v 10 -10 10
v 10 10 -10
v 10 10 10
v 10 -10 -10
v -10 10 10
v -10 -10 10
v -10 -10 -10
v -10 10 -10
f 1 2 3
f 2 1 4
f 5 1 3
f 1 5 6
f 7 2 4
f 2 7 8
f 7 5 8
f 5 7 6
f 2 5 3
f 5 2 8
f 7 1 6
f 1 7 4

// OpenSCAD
// -------------------------------------+---------------------------------------+---------------------------------------+---------------------------------------
// Title:        Parametric Test Block
// Version:      1.2
// Release Date: 2018-07-28 (ISO 8601)
// Author:       Rohin Gosling
// -------------------------------------+---------------------------------------+---------------------------------------+---------------------------------------
//
// Description:
//
// - Simple 3D object generator, to generate test and calibration parts for 3D printers.
//
// Release Notes:
//
// - Version 1.2
//   Updated some default parameters to give the model slightly more consistant default settings.
//   * Updated the default width, height and length of the cuboid, from 10mm to 20mm.
//   * Set the default bore x, y and z diameter, to 10mm.
//
// - Version 1.1
//   * Removed extended ASCII characters to make the source code compatible with the UTF-8 encoding required by the Thingiverse Customizer.
//
// - Version 1.0
//   * Model created.
//
// -------------------------------------+---------------------------------------+---------------------------------------+---------------------------------------

// -------------------------------------+---------------------------------------+---------------------------------------+---------------------------------------
// Constants:
// -------------------------------------+---------------------------------------+---------------------------------------+---------------------------------------

// System constants.

C_CONSTANT = 0 + 0;     // Used to hide constant values from Thingiverse. Add to other constants to hide them as well.

// General constants.

C_NONE = C_CONSTANT + 0;

// SCG constants.

SCG_OVERLAP = C_CONSTANT + 0.01;    // Used for overlapping Boolean operations in order to avoid Boolean edge artefacts.

// Shape

C_SHAPE_NONE      = C_CONSTANT + 0;
C_SHAPE_CUBOID    = C_CONSTANT + 1;
C_SHAPE_CYLINDER  = C_CONSTANT + 2;
C_SHAPE_PYRAMID   = C_CONSTANT + 3;
C_SHAPE_PRISM     = C_CONSTANT + 4;
C_SHAPE_ELLIPSOID = C_CONSTANT + 5;
C_SHAPE_TORUS     = C_CONSTANT + 6;

// Minimum and maximum constraints.

C_RESOLUTION_MIN  = C_CONSTANT + 8;
C_RESOLUTION_MAX  = C_CONSTANT + 64;
C_SIZE_MIN        = C_CONSTANT + 1.0;
C_SIDE_COUNT_MIN  = C_CONSTANT + 3;
C_SIDE_COUNT_MAX  = C_CONSTANT + 12;


// -------------------------------------+---------------------------------------+---------------------------------------+---------------------------------------
// Thingiverse Parameters.
//
// - These parameters are used to integrate with the Thingiverse Customizer, and should only be used by the
//   class member variables specified in the "Model parameters" section below.
//
// - These Thingiverse Parameters should never be accessed from inside any module. We do this to enforce 
//   principles of object orientation.
//
// - By separating concerns between variables exposed to Thingiverse vs. variables used internally by the 
//   SCAD model (class), we are better able to manage the ordering and grouping of variables exposed to 
//   Thingiverse, vs. the ordering and constraints of variables used internally by the model.
//
// -------------------------------------+---------------------------------------+---------------------------------------+---------------------------------------

/* [Assembbly Parameters] */

object_shape    = 1;        // [ 1:Cuboid, 2:Cylinder, 3:Pyramid, 4:Prism, 5:Ellipsoid, 6:Torus ]
x_bore_shape    = 0;        // [ 0: None, 2:Cylinder, 4:Prism ]
y_bore_shape    = 0;        // [ 0: None, 2:Cylinder, 4:Prism ]
z_bore_shape    = 0;        // [ 0: None, 2:Cylinder, 4:Prism ]
resolution      = 128;

/* [Cuboid Parameters] */

cuboid_x      = 20.0;
cuboid_y      = 20.0;
cuboid_z      = 20.0;
cuboid_fillet = 0.0;

/* [Cylinder Parameters] */

cylinder_diameter_base = 20.0;
cylinder_diameter_top  = 20.0;
cylinder_height        = 20.0;

/* [Pyramid Parameters] */

pyramid_side_count  = 4;
pyramid_side_length = 20.0;
pyramid_height      = 20.0;

/* [Prism Parameters] */

prism_side_count  = 3;
prism_side_length = 20.0;
prism_height      = 20.0;

/* [Ellipsoid Parameters] */

ellipsoid_diameter_x = 20.0;
ellipsoid_diameter_y = 20.0;
ellipsoid_diameter_z = 20.0;

/* [Torus Parameters] */

torus_major_radius = 12.0;
torus_minor_radius = 6.0;

/* [Bore Parameters] */

x_bore_diameter         = 10;
y_bore_diameter         = 10;
z_bore_diameter         = 10;
x_bore_prism_side_count = 4;
y_bore_prism_side_count = 4;
z_bore_prism_side_count = 4;

// -------------------------------------+---------------------------------------+---------------------------------------+---------------------------------------
// Model parameters and geometric constraints. (Class member variables).
//
// - If we treat an OpenSCAD file as though it is an object oriented class, then we can prefix global variables
//   with "m_", to denote class membership. 
//   - As an alternative to "m_", we could also use "this_" as a standard. However, "m_" is shorter and faster to type.
//   - Another advantage of this convention, is that we can arrange parameters meant for display in Thingiverse, in 
//     an order that makes sense to the user, while arranging the member versions of the parameters in an order
//     that better accommodates constraint computation.
//
// - Once we have defined global variables as member variables of a class, in this case the class represented
//   by the SCAD file, then we are free to better manage global vs local scope of class member 
//   variables, vs. local module (method) variables.
//
// - Thingiverse only integrates constant literal values. So as long as we reference other parameters or 
//   initialize variables as expressions, then none of these will appear in the Thingiverse customizer.
//
// -------------------------------------+---------------------------------------+---------------------------------------+---------------------------------------

// Assembly Parameters

m_object_shape    = object_shape;
m_x_bore_shape    = x_bore_shape;
m_y_bore_shape    = y_bore_shape;
m_z_bore_shape    = z_bore_shape;
m_resolution      = clip ( resolution, C_RESOLUTION_MIN, C_RESOLUTION_MAX );

// Cuboid Parameters.

m_cuboid_x             = ( cuboid_x < C_SIZE_MIN ) ? C_SIZE_MIN : cuboid_x;
m_cuboid_y             = ( cuboid_y < C_SIZE_MIN ) ? C_SIZE_MIN : cuboid_y;
m_cuboid_z             = ( cuboid_z < C_SIZE_MIN ) ? C_SIZE_MIN : cuboid_z;
m_cuboid_min_dimention = ( m_cuboid_x < m_cuboid_y && m_cuboid_x < m_cuboid_z ) ? m_cuboid_x : ( m_cuboid_y < m_cuboid_x && m_cuboid_y < m_cuboid_z ) ? m_cuboid_y : m_cuboid_z;
m_cuboid_fillet        = clip ( cuboid_fillet, 0.0, m_cuboid_min_dimention/2.0 );

// Cylinder Parameters.

m_cylinder_diameter_base = ( cylinder_diameter_base < 0.0 ) ? 0.0 : cylinder_diameter_base;
m_cylinder_diameter_top  = ( cylinder_diameter_top  < 0.0 ) ? 0.0 : cylinder_diameter_top;
m_cylinder_height        = ( cylinder_height < C_SIZE_MIN ) ? C_SIZE_MIN : cylinder_height;

// Pyramid Parameters.

m_pyramid_side_count  = clip ( pyramid_side_count, C_SIDE_COUNT_MIN, C_SIDE_COUNT_MAX );
m_pyramid_side_length = ( pyramid_side_length < C_SIZE_MIN ) ? C_SIZE_MIN : pyramid_side_length;
m_pyramid_height      = ( pyramid_height < C_SIZE_MIN ) ? C_SIZE_MIN : pyramid_height;

// Prism Parameters.

m_prism_side_count  = clip ( prism_side_count, C_SIDE_COUNT_MIN, C_SIDE_COUNT_MAX );
m_prism_side_length = ( prism_side_length < C_SIZE_MIN ) ? C_SIZE_MIN : prism_side_length;
m_prism_height      = ( prism_height < C_SIZE_MIN ) ? C_SIZE_MIN : prism_height;

// Ellipsoid Parameters.

m_ellipsoid_diameter_x = ( ellipsoid_diameter_x < C_SIZE_MIN ) ? C_SIZE_MIN : ellipsoid_diameter_x;
m_ellipsoid_diameter_y = ( ellipsoid_diameter_y < C_SIZE_MIN ) ? C_SIZE_MIN : ellipsoid_diameter_y;
m_ellipsoid_diameter_z = ( ellipsoid_diameter_z < C_SIZE_MIN ) ? C_SIZE_MIN : ellipsoid_diameter_z;

// Torus Parameters.

m_torus_major_radius = ( torus_major_radius < C_SIZE_MIN ) ? C_SIZE_MIN : torus_major_radius;
m_torus_minor_radius = ( torus_minor_radius < C_SIZE_MIN ) ? C_SIZE_MIN : torus_minor_radius;

// Bore.

m_x_bore_diameter         = ( x_bore_diameter < C_SIZE_MIN ) ? C_SIZE_MIN : x_bore_diameter;
m_y_bore_diameter         = ( y_bore_diameter < C_SIZE_MIN ) ? C_SIZE_MIN : y_bore_diameter;
m_z_bore_diameter         = ( z_bore_diameter < C_SIZE_MIN ) ? C_SIZE_MIN : z_bore_diameter;
m_x_bore_prism_side_count = clip ( x_bore_prism_side_count, C_SIDE_COUNT_MIN, C_SIDE_COUNT_MAX );
m_y_bore_prism_side_count = clip ( y_bore_prism_side_count, C_SIDE_COUNT_MIN, C_SIDE_COUNT_MAX );
m_z_bore_prism_side_count = clip ( z_bore_prism_side_count, C_SIDE_COUNT_MIN, C_SIDE_COUNT_MAX );

// -------------------------------------+---------------------------------------+---------------------------------------+---------------------------------------
// DEBUG: Console Output. 
// -------------------------------------+---------------------------------------+---------------------------------------+---------------------------------------

C_DEBUG_ENABLED = false;

if ( C_DEBUG_ENABLED )
{
    //echo ( m_x = m_x ); 
}

// -------------------------------------+---------------------------------------+---------------------------------------+---------------------------------------
// Module:      Main
// Module Type: Model
//
// Description:
//
// - Program entry point.
//
// -------------------------------------+---------------------------------------+---------------------------------------+---------------------------------------

main();

module main ()
{   
    // Initialize model resolution.
    
    $fn = m_resolution;
    
    // Generate hinge assembly.
        
    assembly ();    
}

// -------------------------------------+---------------------------------------+---------------------------------------+---------------------------------------
// Module:      assembly_main
// Module Type: Assembly
//
// Description:
//
// - Main component assembly.
//
// Parameters:
//
// - N/A
//
// -------------------------------------+---------------------------------------+---------------------------------------+---------------------------------------

module assembly ()
{
    if      ( m_object_shape == C_SHAPE_NONE )      object_none ();
    else if ( m_object_shape == C_SHAPE_CUBOID )    object_cuboid ();
    else if ( m_object_shape == C_SHAPE_CYLINDER )  object_cylinder ();
    else if ( m_object_shape == C_SHAPE_PYRAMID )   object_pyramid ();
    else if ( m_object_shape == C_SHAPE_PRISM )     object_prism ();
    else if ( m_object_shape == C_SHAPE_ELLIPSOID ) object_ellipsoid ();
    else if ( m_object_shape == C_SHAPE_TORUS )     object_torus ();    
    else if ( m_object_shape == C_SHAPE_NONE )      object_none ();    
}

// -------------------------------------+---------------------------------------+---------------------------------------+---------------------------------------
// Module:      object_none
// Module Type: Object
//
// Description:
//
// - Placeholder module for dealing with zero object selection.
//
// Parameters:
//
// - N/A
//
// -------------------------------------+---------------------------------------+---------------------------------------+---------------------------------------

module object_none ()
{
}

// -------------------------------------+---------------------------------------+---------------------------------------+---------------------------------------
// Module:      object_cuboid
// Module Type: Object
//
// Description:
//
// - Cuboid object defined by width, length, height and fillet size.
//
// Parameters:
//
// - N/A
//
// -------------------------------------+---------------------------------------+---------------------------------------+---------------------------------------

module object_cuboid ()
{
    // Initialize parameters.
    
    sf = m_cuboid_fillet;
    sx = m_cuboid_x;
    sy = m_cuboid_y;
    sz = m_cuboid_z;
    
    // Generate object.

    difference ()
    {
        // Generate base object.
        
        if ( sf > 0 )
        {
            object_cuboid_filleted ();
        }
        else
        {
            cube ( size = [ sx, sy, sz ], center = true );
        }
        
        // Subtract bores.
        
        cutting_tool_bore ( sx, sy, sz );
    }
}

// -------------------------------------+---------------------------------------+---------------------------------------+---------------------------------------
// Module:      object_cuboid_filleted
// Module Type: Object
//
// Description:
//
// - Used by the Cuboid object, to implement fillets.
//
// Parameters:
//
// - N/A
//
// -------------------------------------+---------------------------------------+---------------------------------------+---------------------------------------

module object_cuboid_filleted ()
{
    // Local constants.
    
    EDGE_CENTER = 0;    
    EDGE_ANGLE  = 1;
    EDGE_LENGTH = 2;
    
    // Initialize parameters.
    
    sf = m_cuboid_fillet;
    sx = m_cuboid_x;
    sy = m_cuboid_y;
    sz = m_cuboid_z;
    
    // Generate object.

    difference ()
    {
        // Generate base object.
        
        union ()
        {
            // Create cube work pieces.
            
            c = 2.0*sf;
            cube ( size = [ sx,     sy - c, sz - c ], center = true );
            cube ( size = [ sx - c, sy - c, sz     ], center = true );
            cube ( size = [ sx - c, sy,     sz - c ], center = true );
            
            // Create fillets.
            
            rx = sx/2.0 - sf;
            ry = sy/2.0 - sf;
            rz = sz/2.0 - sf;
            
            ex = m_cuboid_x - 2.0*sf;
            ey = m_cuboid_y - 2.0*sf;;
            ez = m_cuboid_z - 2.0*sf;;
            
            // Create vertex fillets.
            
            n_vertex = 8;
            v_vertex =
            [
                [ rx, ry,  rz ],[ -rx, ry,  rz ], [ -rx, -ry,  rz ], [ rx, -ry,  rz ],
                [ rx, ry, -rz ],[ -rx, ry, -rz ], [ -rx, -ry, -rz ], [ rx, -ry, -rz ]
            ];
                              
            for ( i = [ 0 : n_vertex - 1 ] )
            {
                translate ( v_vertex [ i ] ) sphere ( r = sf, center = true );
            }
            
            // Create edge fillets.
            
            n_edge = 12;
            v_edge =
            [
                [ [  rx,  ry, 0.0 ], [  0.0,  0.0, 0.0 ], ez ], [ [ -rx,  ry, 0.0 ], [  0.0,  0.0, 0.0 ], ez ],
                [ [  rx, -ry, 0.0 ], [  0.0,  0.0, 0.0 ], ez ], [ [ -rx, -ry, 0.0 ], [  0.0,  0.0, 0.0 ], ez ],
                [ [  rx, 0.0,  rz ], [ 90.0,  0.0, 0.0 ], ey ], [ [  rx, 0.0, -rz ], [ 90.0,  0.0, 0.0 ], ey ],
                [ [ -rx, 0.0,  rz ], [ 90.0,  0.0, 0.0 ], ey ], [ [ -rx, 0.0, -rz ], [ 90.0,  0.0, 0.0 ], ey ],
                [ [ 0.0,  ry,  rz ], [  0.0, 90.0, 0.0 ], ex ], [ [ 0.0,  ry, -rz ], [  0.0, 90.0, 0.0 ], ex ],
                [ [ 0.0, -ry,  rz ], [  0.0, 90.0, 0.0 ], ex ], [ [ 0.0, -ry, -rz ], [  0.0, 90.0, 0.0 ], ex ]
            ];
            
            for ( i = [ 0 : n_edge - 1 ] )
            {
                v = v_edge [ i ][ EDGE_CENTER ];
                a = v_edge [ i ][ EDGE_ANGLE  ];
                s = v_edge [ i ][ EDGE_LENGTH ];
                
                echo ( a = a );
                
                translate ( v ) rotate ( a ) cylinder ( r = sf, h = s, center = true );
            }
            
        }
        
        // Subtract bores.
        
        cutting_tool_bore ( sx, sy, sz );
    }
}

// -------------------------------------+---------------------------------------+---------------------------------------+---------------------------------------
// Module:      object_cylinder
// Module Type: Object
//
// Description:
//
// - Cylinder object defined by base diameter, top diameter and height.
//
// Parameters:
//
// - N/A
//
// -------------------------------------+---------------------------------------+---------------------------------------+---------------------------------------

module object_cylinder ()
{
    // Initialize parameters.
    
    d1 = m_cylinder_diameter_base;
    d2 = m_cylinder_diameter_top;
    h  = m_cylinder_height;
    
    // Generate object.
    
    difference ()
    {
        // Generate base object.
        
        cylinder ( d1 = d1, d2 = d2, h = h, center = true );
        
        // Subtract bores.
        
        d_max = ( d1 > d2 ) ? d1 : d2;
        cutting_tool_bore ( sx = d_max, sy = d_max, sz = h );
    }
}

// -------------------------------------+---------------------------------------+---------------------------------------+---------------------------------------
// Module:      object_pyramid
// Module Type: Object
//
// Description:
//
// - Pyramid object defined by height, side length, and side count.
//
// Parameters:
//
// - N/A
//
// -------------------------------------+---------------------------------------+---------------------------------------+---------------------------------------

module object_pyramid ()
{
    // Initialize parameters.
    
    n = m_pyramid_side_count;    
    s = m_pyramid_side_length;
    h = m_pyramid_height;
    t = 180/n;
    
    // Compute base diameter based on side length.
        
    d1 = s/sin(180/n);
    d2 = 0;
    
    // Generate object.
    
    difference ()
    {
        // Generate base object.
        
        rotate ( [ 0, 0, t ] ) cylinder ( d1 = d1, d2 = d2, h = h, $fn = n, center = true );
        
        // Subtract bores.
        
        d_max = ( d1 > d2 ) ? d1 : d2;
        translate ( [ 0, 0, -h/5 ] ) cutting_tool_bore ( sx = d_max, sy = d_max, sz = 2*h );
    }
}

// -------------------------------------+---------------------------------------+---------------------------------------+---------------------------------------
// Module:      object_prism
// Module Type: Object
//
// Description:
//
// - Prism object defined by height, side length, and side count.
//
// Parameters:
//
// - N/A
//
// -------------------------------------+---------------------------------------+---------------------------------------+---------------------------------------

module object_prism ()
{
    // Initialize parameters.
    
    n = m_prism_side_count;    
    s = m_prism_side_length;
    h = m_prism_height;
    t = 180/n;
    
    // Compute base diameter based on side length.
        
    d1 = s/sin(180/n);
    d2 = d1;
    
    // Generate object.
    
    difference ()
    {
        // Generate base object.
        
        rotate ( [ 0, 0, t ] ) cylinder ( d1 = d1, d2 = d2, h = h, $fn = n, center = true );
        
        // Subtract bores.
                
        cutting_tool_bore ( sx = d1, sy = d1, sz = h );
    }
}

// -------------------------------------+---------------------------------------+---------------------------------------+---------------------------------------
// Module:      object_ellipsoid
// Module Type: Object
//
// Description:
//
// - Ellipsoid object defined by width, length and height.
//
// Parameters:
//
// - N/A
//
// -------------------------------------+---------------------------------------+---------------------------------------+---------------------------------------

module object_ellipsoid ()
{
    // Compute ellipsoid scaling.
     
    d  = 1.0;     
    sx = m_ellipsoid_diameter_x;
    sy = m_ellipsoid_diameter_y;
    sz = m_ellipsoid_diameter_z;
    
    // Generate object.
    
    difference ()
    {
        // Generate base object.
        
        scale ( [ sx, sy, sz ] ) sphere ( d = d );
        
        // Subtract bores.
                
        cutting_tool_bore ( sx = sx, sy = sy, sz = sz );
    } 
}

// -------------------------------------+---------------------------------------+---------------------------------------+---------------------------------------
// Module:      object_torus
// Module Type: Object
//
// Description:
//
// - Torus object defined by major and minor radii.
//
// Parameters:
//
// - N/A
//
// -------------------------------------+---------------------------------------+---------------------------------------+---------------------------------------

module object_torus ()
{
    // Initialize parameters.
    
    R = m_torus_major_radius;
    r = m_torus_minor_radius;    
    
    // Generate object.
    
    difference ()
    {
        // Generate base object.
        
        rotate_extrude ()
        {
            translate ( [ R, 0, 0 ] ) circle ( r = r);
        }
        
        // Subtract bores.
        
        s  = 2*( r + R );
        sx = s;
        sy = s;
        sz = 2*r;
        
        cutting_tool_bore ( sx = sx, sy = sy, sz = sz );
    } 
}

// -------------------------------------+---------------------------------------+---------------------------------------+---------------------------------------
// Module:      cutting_tool_bore
// Module Type: Cutting tool
//
// Description:
//
// - Cutting tool used to cut the bore holes into the base object.
//
// Parameters:
//
// - N/A
//
// -------------------------------------+---------------------------------------+---------------------------------------+---------------------------------------

module cutting_tool_bore ( sx, sy, sz )
{
    nx = m_x_bore_prism_side_count;
    ny = m_y_bore_prism_side_count;
    nz = m_z_bore_prism_side_count;
    
    txo = ( nx == 6 ) ? 90.0 :   0.0;
    tyo = ( ny == 6 ) ? 0.0  : -90.0;
    
    tx = 180/nx + txo;
    ty = 180/ny + tyo;
    tz = 180/nz;
            
    // Subtract cylindrical bores.
        
    if ( m_x_bore_shape == C_SHAPE_CYLINDER ) rotate ( [ 0, 90, 0 ] ) cylinder ( d = m_x_bore_diameter, h = sx + SCG_OVERLAP, center = true );
    if ( m_y_bore_shape == C_SHAPE_CYLINDER ) rotate ( [ 90, 0, 0 ] ) cylinder ( d = m_y_bore_diameter, h = sy + SCG_OVERLAP, center = true );
    if ( m_z_bore_shape == C_SHAPE_CYLINDER ) rotate ( [ 0,  0, 0 ] ) cylinder ( d = m_z_bore_diameter, h = sz + SCG_OVERLAP, center = true );
            
    // Subtract prisim bores.
    
    if ( m_x_bore_shape == C_SHAPE_PRISM ) rotate ( [ 0, 90, 0 ] ) rotate ( [ 0, 0, tx ] ) cylinder ( d = m_x_bore_diameter, h = sx + SCG_OVERLAP, $fn = nx, center = true );
    if ( m_y_bore_shape == C_SHAPE_PRISM ) rotate ( [ 90, 0, 0 ] ) rotate ( [ 0, 0, ty ] ) cylinder ( d = m_y_bore_diameter, h = sy + SCG_OVERLAP, $fn = ny, center = true );
    if ( m_z_bore_shape == C_SHAPE_PRISM ) rotate ( [ 0,  0, 0 ] ) rotate ( [ 0, 0, tz ] ) cylinder ( d = m_z_bore_diameter, h = sz + SCG_OVERLAP, $fn = nz, center = true );
}


// -------------------------------------+---------------------------------------+---------------------------------------+---------------------------------------
// Module:      Rectangle.
// Module Type: 2D Shape.
//
// Description:
//
// - Creates a 2D rectangle.
//
// Parameters:
//
// - w
//   Rectangle width.
//
// - h
//   Rectangle height.
//
// - center
//   Center the rectangle about the origin (0,0,0) if true, else place the rectangle in the positive quadrant.
//
// -------------------------------------+---------------------------------------+---------------------------------------+---------------------------------------

module fillet_rectangle ( w, h, r, center )
{
    xs = w - 2*r;
    ys = h - 2*r;
    xd = w/2.0 - r;  
    yd = h/2.0 - r;    
    
    union ()
    {
        scale ( [ xs, h  ] ) square ( size = 1.0, center = center );
        scale ( [ w,  ys ] ) square ( size = 1.0, center = center );
        translate ( [  xd,  yd ] ) circle ( r = r, center = center );
        translate ( [  xd, -yd ] ) circle ( r = r, center = center );
        translate ( [ -xd, -yd ] ) circle ( r = r, center = center );
        translate ( [ -xd,  yd ] ) circle ( r = r, center = center );
    }
}

// -------------------------------------+---------------------------------------+---------------------------------------+---------------------------------------
// Module:      Rectangle.
// Module Type: 2D Shape.
//
// Description:
//
// - Creates a 2D rectangle.
//
// Parameters:
//
// - w
//   Rectangle width.
//
// - h
//   Rectangle height.
//
// - center
//   Center the rectangle about the origin (0,0,0) if true, else place the rectangle in the positive quadrant.
//
// -------------------------------------+---------------------------------------+---------------------------------------+---------------------------------------

module rectangle ( w, h, center )
{
    scale ( [ w, h ] ) square ( size = 1.0, center = center );
}

// -------------------------------------+---------------------------------------+---------------------------------------+---------------------------------------
// Function: Clip
//
// Description:
//
// - Clips an input value, to a minimum and maximum value.
//
//   x_min <= x <= x_max
// 
// Parameters:
//
// - x
//   Input value.
//
// - x_min
//   Minimal value constraint. Any x less than x_min, is set to x_min. 
//
// - x_max
//   Maximum value constraint. Any x greater than x_max, is set to x_max.
//
// -------------------------------------+---------------------------------------+---------------------------------------+---------------------------------------

function clip ( x, x_min, x_max ) = ( x < x_min ) ? x_min : ( x > x_max ) ? x_max : x;


// -------------------------------------+---------------------------------------+---------------------------------------+---------------------------------------
// Function: funtion_name
//
// Description:
//
// - Function description.
//
// Return Value:
//
// - Description of return value.
//
// Parameters:
//
// - x
//   Argument x description.
//
// - y
//   Argument y description.
//
// -------------------------------------+---------------------------------------+---------------------------------------+---------------------------------------

// -------------------------------------+---------------------------------------+---------------------------------------+---------------------------------------
// Module:      module_name
// Module Type: [ 2D Shape, Profile, Tool, Workpiece, Component ] 
// Description:
//
// - Module description.
//
// Parameters:
//
// - x
//   Argument x description.
//
// - y
//   Argument y description.
//
// -------------------------------------+---------------------------------------+---------------------------------------+---------------------------------------
